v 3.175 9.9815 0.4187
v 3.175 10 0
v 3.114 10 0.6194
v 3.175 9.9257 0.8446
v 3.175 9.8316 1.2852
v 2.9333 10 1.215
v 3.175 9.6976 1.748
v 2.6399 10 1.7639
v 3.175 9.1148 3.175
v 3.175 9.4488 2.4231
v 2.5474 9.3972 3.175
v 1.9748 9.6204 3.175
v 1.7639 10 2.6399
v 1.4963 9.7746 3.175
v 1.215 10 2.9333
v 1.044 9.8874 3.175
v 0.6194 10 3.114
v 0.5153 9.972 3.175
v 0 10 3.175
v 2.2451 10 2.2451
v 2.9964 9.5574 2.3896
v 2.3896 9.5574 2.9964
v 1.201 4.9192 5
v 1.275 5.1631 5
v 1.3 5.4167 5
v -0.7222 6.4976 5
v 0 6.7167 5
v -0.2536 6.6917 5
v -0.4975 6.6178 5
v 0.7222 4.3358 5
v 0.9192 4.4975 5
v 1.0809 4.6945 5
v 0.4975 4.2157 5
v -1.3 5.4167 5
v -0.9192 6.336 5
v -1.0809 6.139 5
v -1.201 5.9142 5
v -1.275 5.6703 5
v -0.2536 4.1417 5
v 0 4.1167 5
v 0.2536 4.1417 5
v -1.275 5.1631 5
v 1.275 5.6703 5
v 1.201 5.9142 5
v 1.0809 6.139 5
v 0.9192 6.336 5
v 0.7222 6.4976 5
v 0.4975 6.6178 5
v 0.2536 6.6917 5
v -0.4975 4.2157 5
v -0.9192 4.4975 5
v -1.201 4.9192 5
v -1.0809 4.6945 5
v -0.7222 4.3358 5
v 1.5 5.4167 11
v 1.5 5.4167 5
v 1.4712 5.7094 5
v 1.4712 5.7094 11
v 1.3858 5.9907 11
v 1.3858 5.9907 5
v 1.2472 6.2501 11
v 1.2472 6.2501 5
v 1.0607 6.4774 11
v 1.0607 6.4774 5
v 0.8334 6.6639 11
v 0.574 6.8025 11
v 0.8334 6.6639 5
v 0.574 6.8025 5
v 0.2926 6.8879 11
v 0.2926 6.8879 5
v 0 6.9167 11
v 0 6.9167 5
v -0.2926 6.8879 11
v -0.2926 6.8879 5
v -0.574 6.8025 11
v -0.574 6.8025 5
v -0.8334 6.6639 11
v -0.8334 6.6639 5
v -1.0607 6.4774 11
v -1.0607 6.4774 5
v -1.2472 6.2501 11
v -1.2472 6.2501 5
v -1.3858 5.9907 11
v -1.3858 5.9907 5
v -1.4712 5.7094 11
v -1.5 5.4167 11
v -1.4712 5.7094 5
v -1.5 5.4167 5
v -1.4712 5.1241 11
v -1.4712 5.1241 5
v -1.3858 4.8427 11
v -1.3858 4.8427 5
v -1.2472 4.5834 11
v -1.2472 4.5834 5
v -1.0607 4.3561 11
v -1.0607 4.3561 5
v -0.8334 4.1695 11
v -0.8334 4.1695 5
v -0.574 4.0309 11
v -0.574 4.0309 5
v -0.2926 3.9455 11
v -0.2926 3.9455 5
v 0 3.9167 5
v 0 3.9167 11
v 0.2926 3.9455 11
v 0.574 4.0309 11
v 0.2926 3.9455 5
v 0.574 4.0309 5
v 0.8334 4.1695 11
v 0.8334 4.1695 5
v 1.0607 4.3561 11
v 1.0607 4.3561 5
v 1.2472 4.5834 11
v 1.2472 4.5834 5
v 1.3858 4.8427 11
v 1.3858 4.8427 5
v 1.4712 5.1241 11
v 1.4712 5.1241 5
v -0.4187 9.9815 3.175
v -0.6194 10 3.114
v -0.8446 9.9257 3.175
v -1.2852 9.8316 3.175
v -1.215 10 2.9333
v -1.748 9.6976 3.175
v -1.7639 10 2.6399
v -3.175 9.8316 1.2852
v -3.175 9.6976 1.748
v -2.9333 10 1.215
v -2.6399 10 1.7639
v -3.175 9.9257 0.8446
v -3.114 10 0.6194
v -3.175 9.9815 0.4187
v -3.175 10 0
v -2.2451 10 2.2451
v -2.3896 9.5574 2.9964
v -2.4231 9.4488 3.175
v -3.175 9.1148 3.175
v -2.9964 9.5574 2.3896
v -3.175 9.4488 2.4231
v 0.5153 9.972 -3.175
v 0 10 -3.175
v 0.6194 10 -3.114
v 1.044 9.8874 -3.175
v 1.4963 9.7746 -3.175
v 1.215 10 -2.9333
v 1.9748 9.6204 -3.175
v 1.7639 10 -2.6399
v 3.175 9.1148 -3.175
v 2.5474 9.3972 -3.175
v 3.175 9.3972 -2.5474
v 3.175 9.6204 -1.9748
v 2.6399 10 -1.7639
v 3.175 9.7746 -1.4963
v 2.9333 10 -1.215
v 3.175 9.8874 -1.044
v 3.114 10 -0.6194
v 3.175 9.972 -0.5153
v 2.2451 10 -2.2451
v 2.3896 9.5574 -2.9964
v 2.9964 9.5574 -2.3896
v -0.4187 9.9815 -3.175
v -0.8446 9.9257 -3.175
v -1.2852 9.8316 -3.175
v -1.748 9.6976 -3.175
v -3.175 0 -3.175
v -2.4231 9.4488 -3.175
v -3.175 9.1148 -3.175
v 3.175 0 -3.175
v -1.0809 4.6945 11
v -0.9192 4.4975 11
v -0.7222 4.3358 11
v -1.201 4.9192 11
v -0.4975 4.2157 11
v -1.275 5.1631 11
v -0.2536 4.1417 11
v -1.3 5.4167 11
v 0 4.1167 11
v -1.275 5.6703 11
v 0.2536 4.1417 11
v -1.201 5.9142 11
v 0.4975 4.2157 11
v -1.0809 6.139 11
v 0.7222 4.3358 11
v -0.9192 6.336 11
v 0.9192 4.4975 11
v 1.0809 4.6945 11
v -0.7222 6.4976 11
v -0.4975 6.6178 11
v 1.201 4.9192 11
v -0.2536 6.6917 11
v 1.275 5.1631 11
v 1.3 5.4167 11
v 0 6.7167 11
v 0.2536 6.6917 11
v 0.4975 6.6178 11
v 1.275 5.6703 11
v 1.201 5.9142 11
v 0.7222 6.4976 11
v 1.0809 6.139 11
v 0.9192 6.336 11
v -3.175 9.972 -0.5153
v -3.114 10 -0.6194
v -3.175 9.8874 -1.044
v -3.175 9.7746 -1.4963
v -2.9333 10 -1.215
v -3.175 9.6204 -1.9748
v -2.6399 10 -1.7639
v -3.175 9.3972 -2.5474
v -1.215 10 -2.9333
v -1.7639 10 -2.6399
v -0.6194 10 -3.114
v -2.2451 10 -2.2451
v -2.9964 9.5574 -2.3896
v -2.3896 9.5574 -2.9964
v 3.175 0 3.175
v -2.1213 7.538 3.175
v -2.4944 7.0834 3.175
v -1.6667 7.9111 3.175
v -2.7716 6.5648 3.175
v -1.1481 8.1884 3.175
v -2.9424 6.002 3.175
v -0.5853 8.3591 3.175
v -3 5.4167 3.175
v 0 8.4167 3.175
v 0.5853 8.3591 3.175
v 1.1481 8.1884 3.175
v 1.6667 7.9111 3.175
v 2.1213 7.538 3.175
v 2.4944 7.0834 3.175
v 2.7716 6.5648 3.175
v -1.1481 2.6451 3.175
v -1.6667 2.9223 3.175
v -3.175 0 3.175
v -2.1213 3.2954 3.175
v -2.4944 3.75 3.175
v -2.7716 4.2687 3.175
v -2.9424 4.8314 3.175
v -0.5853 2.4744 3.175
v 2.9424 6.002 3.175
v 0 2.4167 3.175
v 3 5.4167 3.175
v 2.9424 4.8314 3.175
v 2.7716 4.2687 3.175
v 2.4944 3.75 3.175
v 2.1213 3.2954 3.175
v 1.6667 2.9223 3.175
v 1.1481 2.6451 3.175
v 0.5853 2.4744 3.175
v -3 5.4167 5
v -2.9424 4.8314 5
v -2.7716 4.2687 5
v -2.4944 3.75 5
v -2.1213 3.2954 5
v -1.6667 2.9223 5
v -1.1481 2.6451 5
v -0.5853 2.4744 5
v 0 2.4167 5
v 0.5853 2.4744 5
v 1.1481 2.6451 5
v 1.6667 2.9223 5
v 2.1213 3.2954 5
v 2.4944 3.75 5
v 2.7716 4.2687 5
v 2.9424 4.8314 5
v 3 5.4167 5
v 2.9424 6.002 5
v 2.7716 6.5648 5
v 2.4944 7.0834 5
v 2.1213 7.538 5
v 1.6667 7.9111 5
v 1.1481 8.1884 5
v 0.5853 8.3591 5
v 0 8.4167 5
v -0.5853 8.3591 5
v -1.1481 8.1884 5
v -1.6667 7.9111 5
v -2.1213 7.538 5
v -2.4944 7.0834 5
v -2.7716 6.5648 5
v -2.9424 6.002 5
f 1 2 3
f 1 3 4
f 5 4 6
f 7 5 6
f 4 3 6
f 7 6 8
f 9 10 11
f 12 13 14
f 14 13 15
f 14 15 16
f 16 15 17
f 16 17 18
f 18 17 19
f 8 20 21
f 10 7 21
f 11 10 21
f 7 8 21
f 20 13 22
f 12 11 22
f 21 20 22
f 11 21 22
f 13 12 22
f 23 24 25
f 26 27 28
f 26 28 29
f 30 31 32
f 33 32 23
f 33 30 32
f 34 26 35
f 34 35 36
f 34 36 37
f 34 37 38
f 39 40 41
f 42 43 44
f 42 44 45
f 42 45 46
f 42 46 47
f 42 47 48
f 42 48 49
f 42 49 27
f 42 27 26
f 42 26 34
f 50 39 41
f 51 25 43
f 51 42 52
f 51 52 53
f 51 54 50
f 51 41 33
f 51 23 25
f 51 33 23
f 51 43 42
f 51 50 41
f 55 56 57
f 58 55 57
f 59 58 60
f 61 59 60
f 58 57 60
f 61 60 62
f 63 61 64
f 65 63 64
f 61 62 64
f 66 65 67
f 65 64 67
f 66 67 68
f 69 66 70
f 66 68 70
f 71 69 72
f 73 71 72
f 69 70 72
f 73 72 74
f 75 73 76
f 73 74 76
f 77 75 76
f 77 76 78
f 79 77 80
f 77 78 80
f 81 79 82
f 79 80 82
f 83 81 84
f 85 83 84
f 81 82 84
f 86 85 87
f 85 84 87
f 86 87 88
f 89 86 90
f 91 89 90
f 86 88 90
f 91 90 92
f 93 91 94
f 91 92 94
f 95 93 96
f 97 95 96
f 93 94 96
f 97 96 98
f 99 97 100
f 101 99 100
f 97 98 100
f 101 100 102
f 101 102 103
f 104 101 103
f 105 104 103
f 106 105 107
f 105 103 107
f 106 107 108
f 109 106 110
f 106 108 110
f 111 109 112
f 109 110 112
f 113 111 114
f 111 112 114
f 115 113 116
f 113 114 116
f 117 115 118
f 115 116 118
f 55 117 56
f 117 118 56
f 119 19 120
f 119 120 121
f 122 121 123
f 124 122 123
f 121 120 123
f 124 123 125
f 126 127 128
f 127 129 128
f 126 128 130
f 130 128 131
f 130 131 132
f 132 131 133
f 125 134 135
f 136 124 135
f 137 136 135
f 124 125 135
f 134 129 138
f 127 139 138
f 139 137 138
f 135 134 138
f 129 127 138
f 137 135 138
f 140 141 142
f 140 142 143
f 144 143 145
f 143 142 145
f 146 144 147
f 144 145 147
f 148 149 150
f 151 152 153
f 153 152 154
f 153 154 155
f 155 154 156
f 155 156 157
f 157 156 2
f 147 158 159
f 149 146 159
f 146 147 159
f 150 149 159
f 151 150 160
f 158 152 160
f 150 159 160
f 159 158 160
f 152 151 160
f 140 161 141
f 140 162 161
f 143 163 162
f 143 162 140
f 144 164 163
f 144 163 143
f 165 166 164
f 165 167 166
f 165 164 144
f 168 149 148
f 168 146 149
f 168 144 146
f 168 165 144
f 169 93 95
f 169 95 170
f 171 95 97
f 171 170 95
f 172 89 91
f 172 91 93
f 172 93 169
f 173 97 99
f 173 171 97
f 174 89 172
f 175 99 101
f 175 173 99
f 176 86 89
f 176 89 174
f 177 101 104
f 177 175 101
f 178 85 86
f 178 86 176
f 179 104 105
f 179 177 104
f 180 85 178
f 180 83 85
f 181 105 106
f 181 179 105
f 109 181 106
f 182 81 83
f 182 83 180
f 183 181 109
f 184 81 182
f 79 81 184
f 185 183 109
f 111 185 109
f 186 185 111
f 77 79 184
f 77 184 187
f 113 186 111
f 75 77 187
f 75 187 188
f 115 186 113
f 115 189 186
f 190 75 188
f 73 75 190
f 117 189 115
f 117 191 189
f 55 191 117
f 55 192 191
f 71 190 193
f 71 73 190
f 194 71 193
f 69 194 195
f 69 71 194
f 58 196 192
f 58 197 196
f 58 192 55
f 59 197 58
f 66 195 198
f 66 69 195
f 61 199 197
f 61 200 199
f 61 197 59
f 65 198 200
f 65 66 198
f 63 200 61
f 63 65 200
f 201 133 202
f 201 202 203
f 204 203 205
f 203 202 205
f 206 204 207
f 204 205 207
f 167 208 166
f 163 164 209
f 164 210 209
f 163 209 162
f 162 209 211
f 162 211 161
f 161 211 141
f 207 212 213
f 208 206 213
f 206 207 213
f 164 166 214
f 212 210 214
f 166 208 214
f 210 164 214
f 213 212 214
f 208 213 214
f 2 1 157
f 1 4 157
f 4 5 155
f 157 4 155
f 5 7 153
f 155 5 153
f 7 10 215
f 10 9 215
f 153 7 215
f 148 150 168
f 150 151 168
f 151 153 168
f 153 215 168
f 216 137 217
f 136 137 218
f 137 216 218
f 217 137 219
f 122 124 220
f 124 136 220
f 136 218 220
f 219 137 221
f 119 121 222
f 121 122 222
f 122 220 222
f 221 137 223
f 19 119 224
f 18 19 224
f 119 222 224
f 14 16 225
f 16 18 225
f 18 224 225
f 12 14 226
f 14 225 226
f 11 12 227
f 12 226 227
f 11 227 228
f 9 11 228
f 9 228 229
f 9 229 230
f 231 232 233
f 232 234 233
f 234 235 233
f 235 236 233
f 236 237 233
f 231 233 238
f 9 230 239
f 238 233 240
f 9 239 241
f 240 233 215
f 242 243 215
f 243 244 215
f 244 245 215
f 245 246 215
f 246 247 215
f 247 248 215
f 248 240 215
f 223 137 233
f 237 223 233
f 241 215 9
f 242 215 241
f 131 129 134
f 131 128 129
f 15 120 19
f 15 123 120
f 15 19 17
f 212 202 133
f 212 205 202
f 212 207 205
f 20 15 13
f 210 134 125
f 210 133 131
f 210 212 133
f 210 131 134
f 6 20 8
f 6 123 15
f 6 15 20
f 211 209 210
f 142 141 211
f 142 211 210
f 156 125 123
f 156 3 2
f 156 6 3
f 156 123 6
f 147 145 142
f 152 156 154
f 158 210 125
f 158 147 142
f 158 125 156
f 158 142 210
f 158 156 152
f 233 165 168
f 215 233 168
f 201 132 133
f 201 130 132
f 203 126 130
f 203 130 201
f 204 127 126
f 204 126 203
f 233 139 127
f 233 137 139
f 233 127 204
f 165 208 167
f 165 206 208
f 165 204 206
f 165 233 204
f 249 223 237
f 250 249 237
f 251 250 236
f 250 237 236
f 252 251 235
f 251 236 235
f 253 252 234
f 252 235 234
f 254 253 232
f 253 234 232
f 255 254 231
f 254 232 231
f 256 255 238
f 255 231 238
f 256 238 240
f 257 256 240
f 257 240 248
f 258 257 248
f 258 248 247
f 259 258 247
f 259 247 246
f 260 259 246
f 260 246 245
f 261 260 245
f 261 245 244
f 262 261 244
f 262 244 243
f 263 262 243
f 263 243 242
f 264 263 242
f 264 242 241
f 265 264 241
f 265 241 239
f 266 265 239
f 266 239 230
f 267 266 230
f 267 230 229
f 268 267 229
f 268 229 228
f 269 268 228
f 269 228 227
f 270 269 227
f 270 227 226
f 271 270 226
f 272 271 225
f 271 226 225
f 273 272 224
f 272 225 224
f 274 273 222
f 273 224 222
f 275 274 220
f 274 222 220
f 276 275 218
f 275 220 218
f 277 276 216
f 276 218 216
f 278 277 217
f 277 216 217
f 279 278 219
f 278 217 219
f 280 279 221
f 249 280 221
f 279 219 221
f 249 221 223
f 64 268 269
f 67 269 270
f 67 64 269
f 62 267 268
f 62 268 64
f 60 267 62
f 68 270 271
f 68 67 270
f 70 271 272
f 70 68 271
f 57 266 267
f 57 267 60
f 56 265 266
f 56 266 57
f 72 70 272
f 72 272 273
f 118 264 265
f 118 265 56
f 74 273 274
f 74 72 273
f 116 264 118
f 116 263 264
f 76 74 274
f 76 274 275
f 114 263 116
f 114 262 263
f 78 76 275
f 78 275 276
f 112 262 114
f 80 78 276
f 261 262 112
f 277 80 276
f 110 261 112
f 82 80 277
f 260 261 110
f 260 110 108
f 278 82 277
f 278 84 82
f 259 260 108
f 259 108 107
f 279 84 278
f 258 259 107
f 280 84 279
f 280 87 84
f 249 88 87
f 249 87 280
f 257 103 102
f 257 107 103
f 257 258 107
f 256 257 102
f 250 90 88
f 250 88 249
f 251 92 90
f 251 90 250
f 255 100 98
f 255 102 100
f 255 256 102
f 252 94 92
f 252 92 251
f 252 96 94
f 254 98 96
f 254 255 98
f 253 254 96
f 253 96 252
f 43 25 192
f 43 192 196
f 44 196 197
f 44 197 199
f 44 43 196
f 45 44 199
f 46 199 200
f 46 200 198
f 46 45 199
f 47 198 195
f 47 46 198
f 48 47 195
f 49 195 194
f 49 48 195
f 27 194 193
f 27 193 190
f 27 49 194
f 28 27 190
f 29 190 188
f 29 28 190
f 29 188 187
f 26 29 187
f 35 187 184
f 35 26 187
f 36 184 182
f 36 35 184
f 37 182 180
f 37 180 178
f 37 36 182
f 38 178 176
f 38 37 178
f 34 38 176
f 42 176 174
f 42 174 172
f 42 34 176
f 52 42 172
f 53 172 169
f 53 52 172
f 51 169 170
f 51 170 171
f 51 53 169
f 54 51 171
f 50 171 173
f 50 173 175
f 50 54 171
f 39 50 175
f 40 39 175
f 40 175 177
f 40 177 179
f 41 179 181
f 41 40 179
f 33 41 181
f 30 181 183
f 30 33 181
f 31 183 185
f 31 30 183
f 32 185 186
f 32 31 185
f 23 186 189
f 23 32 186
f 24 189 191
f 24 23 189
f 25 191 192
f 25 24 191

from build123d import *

# Parameters (mm, degrees)
SKETCH_2_W      = 6.35
SKETCH_2_H      = 6.35
EXTRUDE_1_DEPTH = 10
SKETCH_6_R      = 3
EXTRUDE_2_DEPTH = 5
SKETCH_7_R      = 1.5
SKETCH_7_R_2    = 1.3
EXTRUDE_3_DEPTH = 6


with BuildPart() as part:
    # 草图2 → 凸台-拉伸1 (new body)
    with BuildSketch(Plane(origin=(0, 0, 0), x_dir=(1, 0, 0), z_dir=(0, 1, 0))):
        Rectangle(SKETCH_2_W, SKETCH_2_H)
    extrude(amount=EXTRUDE_1_DEPTH)

    # 草图5 → 切除-旋转1 (revolve, cut)
    with BuildSketch(Plane.XY):
        Polygon((3.175, 10), (5.248872861, 14.588450108), (5.248872861, 8.60417478), align=None)
    revolve(axis=Axis((0, 15.427678148, 0), (0, -1, 0)), mode=Mode.SUBTRACT)

    # 草图6 → 凸台-拉伸2 (add)
    with BuildSketch(Plane.XY):
        with Locations(Location((0, 5.416720089, 0), (0, 0, 180))):
            Circle(SKETCH_6_R)
    extrude(amount=EXTRUDE_2_DEPTH)

    # 草图7 → 凸台-拉伸3 (add)
    with BuildSketch(Plane.XY.offset(5)):
        with Locations((0, 5.416720089)):
            Circle(SKETCH_7_R)
        with Locations((0, 5.416720089)):
            Circle(SKETCH_7_R_2, mode=Mode.SUBTRACT)
    extrude(amount=EXTRUDE_3_DEPTH)


solid = part.part
